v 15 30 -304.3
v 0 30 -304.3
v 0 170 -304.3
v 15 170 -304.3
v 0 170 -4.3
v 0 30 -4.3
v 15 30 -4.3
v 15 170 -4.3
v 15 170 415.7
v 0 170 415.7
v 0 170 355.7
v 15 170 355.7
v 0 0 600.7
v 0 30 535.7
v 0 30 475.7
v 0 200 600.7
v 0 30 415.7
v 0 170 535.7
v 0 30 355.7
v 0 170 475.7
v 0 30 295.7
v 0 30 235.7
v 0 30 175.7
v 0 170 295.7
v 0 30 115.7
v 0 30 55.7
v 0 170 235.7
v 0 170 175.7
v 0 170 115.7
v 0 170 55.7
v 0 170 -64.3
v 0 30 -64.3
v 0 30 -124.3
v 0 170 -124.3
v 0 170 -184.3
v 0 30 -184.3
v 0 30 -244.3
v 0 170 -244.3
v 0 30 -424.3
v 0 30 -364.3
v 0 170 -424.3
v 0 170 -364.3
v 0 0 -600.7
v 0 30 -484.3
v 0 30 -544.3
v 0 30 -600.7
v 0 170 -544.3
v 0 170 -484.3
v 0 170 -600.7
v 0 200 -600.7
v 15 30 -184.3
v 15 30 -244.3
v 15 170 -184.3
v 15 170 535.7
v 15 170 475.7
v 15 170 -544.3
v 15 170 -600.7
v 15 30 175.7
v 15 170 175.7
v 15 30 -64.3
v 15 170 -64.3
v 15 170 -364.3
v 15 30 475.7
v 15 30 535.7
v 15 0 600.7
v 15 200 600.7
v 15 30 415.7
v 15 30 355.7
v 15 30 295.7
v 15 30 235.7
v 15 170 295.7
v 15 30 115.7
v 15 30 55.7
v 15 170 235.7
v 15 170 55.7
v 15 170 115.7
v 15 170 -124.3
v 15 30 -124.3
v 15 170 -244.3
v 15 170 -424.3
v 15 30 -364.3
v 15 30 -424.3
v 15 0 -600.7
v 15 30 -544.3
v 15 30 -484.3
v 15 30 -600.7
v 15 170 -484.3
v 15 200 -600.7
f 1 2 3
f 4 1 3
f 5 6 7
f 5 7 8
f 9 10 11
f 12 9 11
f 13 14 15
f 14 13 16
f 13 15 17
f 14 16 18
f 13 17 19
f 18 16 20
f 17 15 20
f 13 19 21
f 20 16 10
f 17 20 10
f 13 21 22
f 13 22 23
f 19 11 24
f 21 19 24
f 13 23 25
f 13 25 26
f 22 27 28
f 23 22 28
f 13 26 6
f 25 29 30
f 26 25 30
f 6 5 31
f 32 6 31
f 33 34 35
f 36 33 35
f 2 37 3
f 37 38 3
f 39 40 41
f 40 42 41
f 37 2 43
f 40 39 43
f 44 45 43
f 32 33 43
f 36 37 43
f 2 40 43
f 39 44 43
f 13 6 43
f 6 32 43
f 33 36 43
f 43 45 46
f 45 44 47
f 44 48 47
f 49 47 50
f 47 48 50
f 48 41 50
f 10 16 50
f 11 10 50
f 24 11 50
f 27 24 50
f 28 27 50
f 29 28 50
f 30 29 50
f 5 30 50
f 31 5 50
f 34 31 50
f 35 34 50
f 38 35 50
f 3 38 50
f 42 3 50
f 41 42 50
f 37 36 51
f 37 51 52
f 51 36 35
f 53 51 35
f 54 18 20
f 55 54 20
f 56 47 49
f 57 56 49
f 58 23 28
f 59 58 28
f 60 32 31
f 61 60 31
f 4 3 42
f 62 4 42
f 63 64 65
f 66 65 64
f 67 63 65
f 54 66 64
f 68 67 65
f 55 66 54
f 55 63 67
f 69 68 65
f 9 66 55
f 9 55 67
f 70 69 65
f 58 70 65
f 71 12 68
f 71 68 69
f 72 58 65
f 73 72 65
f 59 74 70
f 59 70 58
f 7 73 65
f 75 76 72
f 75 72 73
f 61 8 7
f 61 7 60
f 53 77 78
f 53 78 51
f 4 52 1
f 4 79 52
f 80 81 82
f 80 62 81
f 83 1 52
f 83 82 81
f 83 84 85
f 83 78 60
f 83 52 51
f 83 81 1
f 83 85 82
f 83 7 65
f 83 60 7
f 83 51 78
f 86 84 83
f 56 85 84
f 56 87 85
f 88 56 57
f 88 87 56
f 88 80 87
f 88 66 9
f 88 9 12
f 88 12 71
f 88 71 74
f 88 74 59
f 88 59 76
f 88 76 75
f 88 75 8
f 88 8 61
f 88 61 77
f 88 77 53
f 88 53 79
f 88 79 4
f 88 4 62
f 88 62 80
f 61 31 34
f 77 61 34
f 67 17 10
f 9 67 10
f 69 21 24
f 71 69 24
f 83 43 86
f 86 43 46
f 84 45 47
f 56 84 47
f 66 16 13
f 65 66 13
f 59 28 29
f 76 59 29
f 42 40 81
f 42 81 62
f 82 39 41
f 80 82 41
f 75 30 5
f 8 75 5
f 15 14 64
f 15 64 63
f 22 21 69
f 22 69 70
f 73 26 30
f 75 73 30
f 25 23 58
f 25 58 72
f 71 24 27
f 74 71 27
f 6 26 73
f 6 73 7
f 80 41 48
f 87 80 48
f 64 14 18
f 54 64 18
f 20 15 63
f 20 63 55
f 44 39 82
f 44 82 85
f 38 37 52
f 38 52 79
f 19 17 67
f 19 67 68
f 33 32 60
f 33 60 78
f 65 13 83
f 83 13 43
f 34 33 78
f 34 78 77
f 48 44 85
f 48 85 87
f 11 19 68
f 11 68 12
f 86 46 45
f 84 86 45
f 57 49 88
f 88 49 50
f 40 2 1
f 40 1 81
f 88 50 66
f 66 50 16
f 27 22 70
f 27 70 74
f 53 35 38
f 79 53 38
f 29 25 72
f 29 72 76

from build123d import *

# Parameters (mm, degrees)
SKETCH1_W           = 60
SKETCH1_H           = 140
BOSS_EXTRUDE1_DEPTH = 15


with BuildPart() as part:
    # Sketch1 → Boss-Extrude1 (new body)
    with BuildSketch(Plane(origin=(0, 0, 0), x_dir=(0, 0, -1), z_dir=(1, 0, 0))):
        Polygon((-600.7, 0), (600.7, 0), (600.7, 30), (544.3, 30), (544.3, 170), (600.7, 170), (600.7, 200), (-600.7, 200), align=None)
        with Locations((-505.7, 100)):
            Rectangle(SKETCH1_W, SKETCH1_H, mode=Mode.SUBTRACT)
        with Locations((-385.7, 100)):
            Rectangle(SKETCH1_W, SKETCH1_H, mode=Mode.SUBTRACT)
        with Locations((-265.7, 100)):
            Rectangle(SKETCH1_W, SKETCH1_H, mode=Mode.SUBTRACT)
        with Locations((-145.7, 100)):
            Rectangle(SKETCH1_W, SKETCH1_H, mode=Mode.SUBTRACT)
        with Locations((-25.7, 100)):
            Rectangle(SKETCH1_W, SKETCH1_H, mode=Mode.SUBTRACT)
        with Locations((94.3, 100)):
            Rectangle(SKETCH1_W, SKETCH1_H, mode=Mode.SUBTRACT)
        with Locations((214.3, 100)):
            Rectangle(SKETCH1_W, SKETCH1_H, mode=Mode.SUBTRACT)
        with Locations((334.3, 100)):
            Rectangle(SKETCH1_W, SKETCH1_H, mode=Mode.SUBTRACT)
        with Locations((454.3, 100)):
            Rectangle(SKETCH1_W, SKETCH1_H, mode=Mode.SUBTRACT)
    extrude(amount=BOSS_EXTRUDE1_DEPTH)


solid = part.part
